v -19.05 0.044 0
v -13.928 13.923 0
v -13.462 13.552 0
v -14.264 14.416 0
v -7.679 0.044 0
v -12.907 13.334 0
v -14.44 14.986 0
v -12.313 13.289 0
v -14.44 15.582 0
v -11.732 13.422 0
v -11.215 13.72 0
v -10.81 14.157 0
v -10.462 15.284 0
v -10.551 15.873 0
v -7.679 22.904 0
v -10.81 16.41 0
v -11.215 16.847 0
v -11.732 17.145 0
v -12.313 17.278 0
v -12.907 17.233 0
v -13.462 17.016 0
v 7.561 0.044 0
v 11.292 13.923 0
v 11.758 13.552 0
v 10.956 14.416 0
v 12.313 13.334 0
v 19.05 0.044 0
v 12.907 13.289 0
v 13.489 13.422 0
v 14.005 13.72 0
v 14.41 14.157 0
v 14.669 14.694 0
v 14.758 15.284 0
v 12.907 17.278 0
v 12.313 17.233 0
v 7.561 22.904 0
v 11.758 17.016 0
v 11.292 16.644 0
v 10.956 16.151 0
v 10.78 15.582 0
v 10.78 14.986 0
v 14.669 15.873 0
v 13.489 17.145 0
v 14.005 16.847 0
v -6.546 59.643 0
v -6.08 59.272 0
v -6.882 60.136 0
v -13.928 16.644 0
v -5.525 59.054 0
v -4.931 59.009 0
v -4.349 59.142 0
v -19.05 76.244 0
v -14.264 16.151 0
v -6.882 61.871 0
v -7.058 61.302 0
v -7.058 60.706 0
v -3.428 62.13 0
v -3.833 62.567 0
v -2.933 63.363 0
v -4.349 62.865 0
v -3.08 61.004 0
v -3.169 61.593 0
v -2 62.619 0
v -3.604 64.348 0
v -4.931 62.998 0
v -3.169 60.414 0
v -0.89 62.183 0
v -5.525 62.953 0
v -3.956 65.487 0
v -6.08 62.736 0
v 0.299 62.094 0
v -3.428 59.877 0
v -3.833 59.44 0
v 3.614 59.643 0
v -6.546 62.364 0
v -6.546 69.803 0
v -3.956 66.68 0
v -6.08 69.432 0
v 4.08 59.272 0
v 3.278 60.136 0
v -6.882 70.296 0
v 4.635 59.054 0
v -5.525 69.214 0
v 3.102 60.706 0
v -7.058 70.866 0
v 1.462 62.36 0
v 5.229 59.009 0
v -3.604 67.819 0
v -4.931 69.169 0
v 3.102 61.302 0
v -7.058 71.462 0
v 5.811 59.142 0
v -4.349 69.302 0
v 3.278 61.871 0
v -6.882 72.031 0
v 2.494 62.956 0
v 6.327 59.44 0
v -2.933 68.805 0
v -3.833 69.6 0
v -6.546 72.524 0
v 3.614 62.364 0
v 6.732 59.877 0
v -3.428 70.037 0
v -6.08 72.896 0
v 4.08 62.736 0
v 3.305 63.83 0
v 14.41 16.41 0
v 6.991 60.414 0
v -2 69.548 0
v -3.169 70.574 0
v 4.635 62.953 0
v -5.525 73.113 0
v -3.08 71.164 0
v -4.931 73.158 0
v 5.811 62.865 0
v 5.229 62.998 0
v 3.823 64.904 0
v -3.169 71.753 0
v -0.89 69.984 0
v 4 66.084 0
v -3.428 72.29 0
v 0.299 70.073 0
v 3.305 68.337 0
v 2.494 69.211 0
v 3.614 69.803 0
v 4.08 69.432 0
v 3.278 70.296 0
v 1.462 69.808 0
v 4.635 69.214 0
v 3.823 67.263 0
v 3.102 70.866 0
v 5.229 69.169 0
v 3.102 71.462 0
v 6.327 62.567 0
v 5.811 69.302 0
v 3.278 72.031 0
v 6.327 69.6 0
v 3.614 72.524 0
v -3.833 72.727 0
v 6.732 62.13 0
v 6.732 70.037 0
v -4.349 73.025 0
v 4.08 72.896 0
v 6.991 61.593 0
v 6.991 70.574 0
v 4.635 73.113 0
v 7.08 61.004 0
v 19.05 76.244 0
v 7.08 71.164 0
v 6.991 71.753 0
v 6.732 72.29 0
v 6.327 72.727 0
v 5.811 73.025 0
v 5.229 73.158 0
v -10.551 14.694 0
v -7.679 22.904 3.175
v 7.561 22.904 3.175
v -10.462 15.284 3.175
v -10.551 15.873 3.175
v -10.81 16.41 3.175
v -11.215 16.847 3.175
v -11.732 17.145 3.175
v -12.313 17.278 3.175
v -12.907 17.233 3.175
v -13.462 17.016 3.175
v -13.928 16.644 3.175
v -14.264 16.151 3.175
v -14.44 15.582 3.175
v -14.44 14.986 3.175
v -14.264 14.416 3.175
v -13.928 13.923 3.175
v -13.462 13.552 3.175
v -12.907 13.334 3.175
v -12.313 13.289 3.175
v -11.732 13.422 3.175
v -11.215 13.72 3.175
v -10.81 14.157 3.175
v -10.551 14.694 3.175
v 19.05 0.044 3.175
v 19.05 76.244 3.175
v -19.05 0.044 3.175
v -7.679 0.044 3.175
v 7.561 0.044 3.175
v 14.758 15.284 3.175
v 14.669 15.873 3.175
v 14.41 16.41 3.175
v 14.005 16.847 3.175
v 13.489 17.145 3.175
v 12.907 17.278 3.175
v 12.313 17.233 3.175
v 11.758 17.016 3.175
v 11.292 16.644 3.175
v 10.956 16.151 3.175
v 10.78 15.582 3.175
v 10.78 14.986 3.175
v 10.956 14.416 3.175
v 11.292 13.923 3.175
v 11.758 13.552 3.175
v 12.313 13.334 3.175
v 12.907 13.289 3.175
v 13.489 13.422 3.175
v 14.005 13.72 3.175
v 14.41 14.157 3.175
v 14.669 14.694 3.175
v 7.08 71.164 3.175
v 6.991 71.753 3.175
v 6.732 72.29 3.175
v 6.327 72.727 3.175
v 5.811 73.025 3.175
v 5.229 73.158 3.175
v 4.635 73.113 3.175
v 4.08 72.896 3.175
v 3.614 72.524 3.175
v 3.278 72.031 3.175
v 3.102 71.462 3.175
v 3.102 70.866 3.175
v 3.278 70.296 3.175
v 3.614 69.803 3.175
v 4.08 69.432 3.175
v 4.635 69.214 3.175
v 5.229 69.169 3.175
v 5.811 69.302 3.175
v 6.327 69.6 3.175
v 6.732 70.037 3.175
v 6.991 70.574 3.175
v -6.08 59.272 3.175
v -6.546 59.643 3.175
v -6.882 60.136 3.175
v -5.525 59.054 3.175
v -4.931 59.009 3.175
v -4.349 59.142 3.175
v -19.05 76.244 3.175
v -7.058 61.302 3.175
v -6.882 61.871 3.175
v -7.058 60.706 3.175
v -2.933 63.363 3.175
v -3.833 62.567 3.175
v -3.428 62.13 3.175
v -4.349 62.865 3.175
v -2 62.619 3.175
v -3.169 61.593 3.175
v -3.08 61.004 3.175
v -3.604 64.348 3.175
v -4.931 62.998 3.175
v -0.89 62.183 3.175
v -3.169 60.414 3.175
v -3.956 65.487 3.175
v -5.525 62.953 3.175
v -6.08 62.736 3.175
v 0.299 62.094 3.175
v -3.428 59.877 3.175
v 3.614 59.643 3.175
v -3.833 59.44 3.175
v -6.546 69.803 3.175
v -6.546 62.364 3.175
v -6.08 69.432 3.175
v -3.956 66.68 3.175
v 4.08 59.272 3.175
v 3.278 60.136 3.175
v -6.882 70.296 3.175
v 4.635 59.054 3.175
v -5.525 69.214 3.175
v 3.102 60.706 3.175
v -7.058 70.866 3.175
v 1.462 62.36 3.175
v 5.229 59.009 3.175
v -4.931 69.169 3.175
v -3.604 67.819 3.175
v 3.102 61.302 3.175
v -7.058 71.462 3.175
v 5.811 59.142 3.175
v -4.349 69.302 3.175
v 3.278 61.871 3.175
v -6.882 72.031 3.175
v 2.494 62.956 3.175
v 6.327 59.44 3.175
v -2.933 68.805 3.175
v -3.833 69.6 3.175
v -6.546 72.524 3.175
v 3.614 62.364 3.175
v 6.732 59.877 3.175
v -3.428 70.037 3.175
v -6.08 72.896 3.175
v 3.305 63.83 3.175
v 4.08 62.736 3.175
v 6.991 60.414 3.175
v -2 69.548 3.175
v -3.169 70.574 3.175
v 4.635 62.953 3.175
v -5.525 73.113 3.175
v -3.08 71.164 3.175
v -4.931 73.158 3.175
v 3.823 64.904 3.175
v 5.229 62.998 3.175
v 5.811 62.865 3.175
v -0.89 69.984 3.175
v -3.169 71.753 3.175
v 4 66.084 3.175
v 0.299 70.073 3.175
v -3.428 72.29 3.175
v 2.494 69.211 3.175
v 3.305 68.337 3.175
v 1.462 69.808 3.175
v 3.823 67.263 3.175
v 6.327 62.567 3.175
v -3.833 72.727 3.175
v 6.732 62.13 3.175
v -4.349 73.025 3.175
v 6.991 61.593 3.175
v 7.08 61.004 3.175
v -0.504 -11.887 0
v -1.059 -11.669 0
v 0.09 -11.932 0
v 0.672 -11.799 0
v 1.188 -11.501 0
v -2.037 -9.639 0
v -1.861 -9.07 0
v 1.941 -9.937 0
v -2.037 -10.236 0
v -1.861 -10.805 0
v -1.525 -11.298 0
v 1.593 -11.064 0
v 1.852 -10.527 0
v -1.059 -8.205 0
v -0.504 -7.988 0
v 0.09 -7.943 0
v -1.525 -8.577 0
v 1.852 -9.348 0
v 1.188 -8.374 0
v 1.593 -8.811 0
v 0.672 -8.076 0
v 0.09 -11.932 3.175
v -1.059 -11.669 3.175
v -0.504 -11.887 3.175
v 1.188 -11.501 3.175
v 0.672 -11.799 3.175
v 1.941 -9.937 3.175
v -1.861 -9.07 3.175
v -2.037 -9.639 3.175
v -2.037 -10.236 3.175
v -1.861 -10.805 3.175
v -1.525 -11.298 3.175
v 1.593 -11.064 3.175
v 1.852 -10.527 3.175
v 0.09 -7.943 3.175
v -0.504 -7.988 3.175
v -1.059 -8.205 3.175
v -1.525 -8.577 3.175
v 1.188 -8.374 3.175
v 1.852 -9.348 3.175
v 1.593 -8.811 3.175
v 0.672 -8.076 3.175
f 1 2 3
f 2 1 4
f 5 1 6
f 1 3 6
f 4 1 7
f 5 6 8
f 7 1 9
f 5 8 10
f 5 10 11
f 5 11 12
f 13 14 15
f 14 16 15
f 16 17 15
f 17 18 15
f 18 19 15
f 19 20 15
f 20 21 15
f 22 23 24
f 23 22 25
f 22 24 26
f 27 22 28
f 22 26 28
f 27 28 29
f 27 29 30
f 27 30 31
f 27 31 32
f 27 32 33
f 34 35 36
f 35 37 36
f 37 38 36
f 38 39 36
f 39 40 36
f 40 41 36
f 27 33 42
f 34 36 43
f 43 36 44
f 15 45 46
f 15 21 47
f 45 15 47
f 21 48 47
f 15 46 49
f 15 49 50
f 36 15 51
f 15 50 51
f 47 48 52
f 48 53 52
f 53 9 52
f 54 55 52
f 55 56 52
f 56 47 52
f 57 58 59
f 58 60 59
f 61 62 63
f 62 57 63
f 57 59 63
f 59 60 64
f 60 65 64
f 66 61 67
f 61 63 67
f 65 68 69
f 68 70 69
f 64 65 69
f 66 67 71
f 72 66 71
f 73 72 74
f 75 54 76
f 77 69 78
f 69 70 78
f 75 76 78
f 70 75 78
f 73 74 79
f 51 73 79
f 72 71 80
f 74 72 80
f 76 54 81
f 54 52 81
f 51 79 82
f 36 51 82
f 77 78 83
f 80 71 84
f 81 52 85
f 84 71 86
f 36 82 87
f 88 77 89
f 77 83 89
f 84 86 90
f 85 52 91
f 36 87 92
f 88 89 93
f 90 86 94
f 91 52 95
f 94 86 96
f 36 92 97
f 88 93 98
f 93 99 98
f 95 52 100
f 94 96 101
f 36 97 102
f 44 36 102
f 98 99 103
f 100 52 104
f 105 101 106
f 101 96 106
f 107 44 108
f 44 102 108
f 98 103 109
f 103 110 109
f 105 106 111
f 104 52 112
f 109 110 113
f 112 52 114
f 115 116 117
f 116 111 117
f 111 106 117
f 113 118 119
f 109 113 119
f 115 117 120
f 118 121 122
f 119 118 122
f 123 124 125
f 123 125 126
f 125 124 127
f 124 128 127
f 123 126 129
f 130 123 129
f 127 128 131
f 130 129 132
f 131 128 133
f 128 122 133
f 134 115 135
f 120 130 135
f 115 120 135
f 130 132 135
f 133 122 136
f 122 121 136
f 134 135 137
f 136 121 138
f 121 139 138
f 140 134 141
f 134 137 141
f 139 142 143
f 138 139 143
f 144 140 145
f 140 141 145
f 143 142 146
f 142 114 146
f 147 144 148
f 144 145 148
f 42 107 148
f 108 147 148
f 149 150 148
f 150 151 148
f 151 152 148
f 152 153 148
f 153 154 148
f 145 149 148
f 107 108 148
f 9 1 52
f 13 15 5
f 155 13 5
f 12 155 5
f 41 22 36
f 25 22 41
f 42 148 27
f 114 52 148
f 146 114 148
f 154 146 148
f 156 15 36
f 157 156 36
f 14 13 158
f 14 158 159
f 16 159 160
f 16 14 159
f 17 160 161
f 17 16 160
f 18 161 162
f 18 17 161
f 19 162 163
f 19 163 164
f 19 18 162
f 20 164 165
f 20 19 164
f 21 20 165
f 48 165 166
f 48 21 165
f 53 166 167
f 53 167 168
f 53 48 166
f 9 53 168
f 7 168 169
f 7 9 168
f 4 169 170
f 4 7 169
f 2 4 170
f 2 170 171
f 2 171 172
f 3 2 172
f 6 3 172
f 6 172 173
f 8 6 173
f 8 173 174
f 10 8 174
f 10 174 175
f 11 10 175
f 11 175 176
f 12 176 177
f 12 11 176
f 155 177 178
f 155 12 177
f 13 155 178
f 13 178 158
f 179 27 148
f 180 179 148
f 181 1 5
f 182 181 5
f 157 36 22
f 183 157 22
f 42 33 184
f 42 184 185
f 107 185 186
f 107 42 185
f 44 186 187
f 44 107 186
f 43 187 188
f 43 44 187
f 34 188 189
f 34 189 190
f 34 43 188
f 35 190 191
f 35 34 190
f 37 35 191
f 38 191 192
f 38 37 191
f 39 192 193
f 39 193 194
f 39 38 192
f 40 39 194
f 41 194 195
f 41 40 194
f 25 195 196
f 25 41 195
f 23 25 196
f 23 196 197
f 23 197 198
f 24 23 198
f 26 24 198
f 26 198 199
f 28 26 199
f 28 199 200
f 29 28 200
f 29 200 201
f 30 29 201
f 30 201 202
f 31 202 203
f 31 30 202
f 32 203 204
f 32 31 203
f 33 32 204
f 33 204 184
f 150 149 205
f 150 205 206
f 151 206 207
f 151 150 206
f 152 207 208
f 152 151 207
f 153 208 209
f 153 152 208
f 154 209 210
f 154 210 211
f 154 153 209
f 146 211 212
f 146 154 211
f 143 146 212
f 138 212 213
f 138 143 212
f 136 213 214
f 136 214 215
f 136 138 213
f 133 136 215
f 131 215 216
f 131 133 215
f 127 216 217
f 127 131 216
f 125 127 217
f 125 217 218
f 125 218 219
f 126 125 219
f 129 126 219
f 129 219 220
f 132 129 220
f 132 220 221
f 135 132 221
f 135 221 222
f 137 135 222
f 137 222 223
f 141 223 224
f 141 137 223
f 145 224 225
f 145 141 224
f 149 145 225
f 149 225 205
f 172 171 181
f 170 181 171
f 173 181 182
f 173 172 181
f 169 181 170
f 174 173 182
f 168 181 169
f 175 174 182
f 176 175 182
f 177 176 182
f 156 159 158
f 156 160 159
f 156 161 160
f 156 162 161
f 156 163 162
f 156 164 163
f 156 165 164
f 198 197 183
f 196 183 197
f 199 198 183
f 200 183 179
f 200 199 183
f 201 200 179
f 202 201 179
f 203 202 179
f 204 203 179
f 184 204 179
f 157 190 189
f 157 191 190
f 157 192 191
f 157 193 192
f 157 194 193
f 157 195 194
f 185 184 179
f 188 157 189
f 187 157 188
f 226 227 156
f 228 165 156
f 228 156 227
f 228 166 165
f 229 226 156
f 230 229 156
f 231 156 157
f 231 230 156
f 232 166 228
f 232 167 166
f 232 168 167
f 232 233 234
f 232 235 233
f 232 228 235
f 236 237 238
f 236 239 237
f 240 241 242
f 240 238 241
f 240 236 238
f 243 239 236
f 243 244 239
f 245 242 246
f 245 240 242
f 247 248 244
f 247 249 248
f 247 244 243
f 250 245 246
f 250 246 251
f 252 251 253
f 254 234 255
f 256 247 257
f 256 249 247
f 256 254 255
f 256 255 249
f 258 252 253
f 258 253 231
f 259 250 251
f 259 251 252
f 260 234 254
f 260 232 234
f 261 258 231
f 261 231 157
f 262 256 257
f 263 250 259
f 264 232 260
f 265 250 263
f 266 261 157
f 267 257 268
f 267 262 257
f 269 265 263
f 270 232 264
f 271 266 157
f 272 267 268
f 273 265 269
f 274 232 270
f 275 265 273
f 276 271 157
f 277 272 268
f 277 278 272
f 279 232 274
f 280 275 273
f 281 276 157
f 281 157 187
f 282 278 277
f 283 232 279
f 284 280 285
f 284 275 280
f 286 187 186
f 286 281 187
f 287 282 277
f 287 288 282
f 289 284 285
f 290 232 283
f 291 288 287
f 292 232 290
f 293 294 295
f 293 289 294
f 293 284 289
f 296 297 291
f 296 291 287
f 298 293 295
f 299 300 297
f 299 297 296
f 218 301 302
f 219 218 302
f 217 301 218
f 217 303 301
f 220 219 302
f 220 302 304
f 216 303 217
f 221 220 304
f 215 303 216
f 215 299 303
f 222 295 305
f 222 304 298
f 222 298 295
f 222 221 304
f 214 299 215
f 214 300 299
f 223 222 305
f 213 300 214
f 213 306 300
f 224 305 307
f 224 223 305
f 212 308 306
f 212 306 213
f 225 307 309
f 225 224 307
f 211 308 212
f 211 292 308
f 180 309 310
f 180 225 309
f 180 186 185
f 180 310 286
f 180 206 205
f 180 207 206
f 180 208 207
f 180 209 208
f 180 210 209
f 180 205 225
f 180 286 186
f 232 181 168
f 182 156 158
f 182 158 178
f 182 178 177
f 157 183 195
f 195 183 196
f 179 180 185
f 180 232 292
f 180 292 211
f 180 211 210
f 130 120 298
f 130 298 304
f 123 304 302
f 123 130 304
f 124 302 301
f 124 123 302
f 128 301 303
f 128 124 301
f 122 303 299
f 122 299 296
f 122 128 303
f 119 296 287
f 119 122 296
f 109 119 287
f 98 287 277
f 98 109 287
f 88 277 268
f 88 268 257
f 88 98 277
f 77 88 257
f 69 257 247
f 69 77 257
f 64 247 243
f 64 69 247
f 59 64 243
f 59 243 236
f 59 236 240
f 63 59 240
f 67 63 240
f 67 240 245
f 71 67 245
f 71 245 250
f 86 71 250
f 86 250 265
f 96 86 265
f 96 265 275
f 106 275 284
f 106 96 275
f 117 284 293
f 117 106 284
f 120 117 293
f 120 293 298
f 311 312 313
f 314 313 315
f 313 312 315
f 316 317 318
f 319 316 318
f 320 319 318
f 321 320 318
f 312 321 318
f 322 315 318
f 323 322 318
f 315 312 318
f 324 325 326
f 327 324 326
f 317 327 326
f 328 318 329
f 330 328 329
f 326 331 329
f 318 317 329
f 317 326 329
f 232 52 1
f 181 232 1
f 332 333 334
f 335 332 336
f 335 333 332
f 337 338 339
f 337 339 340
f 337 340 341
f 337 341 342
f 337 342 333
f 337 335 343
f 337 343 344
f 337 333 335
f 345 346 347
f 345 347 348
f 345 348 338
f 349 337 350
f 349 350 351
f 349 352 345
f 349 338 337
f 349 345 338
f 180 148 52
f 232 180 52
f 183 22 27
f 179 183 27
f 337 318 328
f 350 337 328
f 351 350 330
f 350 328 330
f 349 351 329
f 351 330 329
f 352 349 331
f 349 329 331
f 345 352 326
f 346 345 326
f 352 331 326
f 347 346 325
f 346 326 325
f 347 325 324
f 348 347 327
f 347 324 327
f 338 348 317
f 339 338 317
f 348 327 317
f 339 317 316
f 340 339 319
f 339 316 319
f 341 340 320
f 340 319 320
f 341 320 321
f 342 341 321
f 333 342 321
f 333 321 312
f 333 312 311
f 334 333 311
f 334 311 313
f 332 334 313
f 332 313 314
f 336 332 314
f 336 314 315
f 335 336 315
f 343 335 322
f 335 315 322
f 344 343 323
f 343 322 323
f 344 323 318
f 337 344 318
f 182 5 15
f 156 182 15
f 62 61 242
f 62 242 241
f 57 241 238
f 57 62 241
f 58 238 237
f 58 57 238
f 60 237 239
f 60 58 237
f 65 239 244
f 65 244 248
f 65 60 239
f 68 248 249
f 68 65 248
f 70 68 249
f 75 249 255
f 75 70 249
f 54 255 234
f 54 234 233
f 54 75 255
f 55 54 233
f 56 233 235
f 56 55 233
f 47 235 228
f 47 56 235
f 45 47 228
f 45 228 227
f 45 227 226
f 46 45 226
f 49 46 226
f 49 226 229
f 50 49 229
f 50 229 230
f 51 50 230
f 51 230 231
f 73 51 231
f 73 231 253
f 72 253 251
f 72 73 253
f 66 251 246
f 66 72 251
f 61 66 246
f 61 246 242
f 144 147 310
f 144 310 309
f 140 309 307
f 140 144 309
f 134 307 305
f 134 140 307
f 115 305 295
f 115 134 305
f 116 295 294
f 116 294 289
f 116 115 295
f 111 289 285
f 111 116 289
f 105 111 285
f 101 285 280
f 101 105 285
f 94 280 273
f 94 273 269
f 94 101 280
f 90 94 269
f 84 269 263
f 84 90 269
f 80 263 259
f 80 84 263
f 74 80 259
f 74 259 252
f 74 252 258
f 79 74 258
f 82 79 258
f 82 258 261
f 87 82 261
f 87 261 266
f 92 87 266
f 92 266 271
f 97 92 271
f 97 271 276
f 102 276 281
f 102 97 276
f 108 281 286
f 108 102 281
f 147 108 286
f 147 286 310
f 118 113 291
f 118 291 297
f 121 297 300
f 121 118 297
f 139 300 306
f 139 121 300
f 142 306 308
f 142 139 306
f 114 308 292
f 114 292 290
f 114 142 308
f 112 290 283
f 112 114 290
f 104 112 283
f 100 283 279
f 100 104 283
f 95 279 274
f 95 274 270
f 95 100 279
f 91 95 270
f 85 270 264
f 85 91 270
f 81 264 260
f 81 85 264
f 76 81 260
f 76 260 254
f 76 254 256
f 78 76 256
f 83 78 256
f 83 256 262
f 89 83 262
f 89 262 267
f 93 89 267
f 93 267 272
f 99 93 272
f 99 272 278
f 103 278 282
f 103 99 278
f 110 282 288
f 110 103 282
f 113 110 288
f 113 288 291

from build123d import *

# Parameters (mm, degrees)
F0_R     = 2
F0_R_2   = 4.0005
F2_DEPTH = 3.175


with BuildPart() as f2:
    # F0 (on Top) → F2 (new body)
    with BuildSketch(Plane.XY):
        with Locations((-0.059144, -9.937426)):
            Circle(F0_R)
        Polygon((-19.05, 76.243628), (-19.05, 0.043628), (-7.679144, 0.043628), (-7.679144, 22.903628), (7.560856, 22.903628), (7.560856, 0.043628), (19.05, 0.043628), (19.05, 76.243628), align=None)
        with Locations((-12.46229, 15.283628)):
            Circle(F0_R, mode=Mode.SUBTRACT)
        with Locations((12.758011, 15.283628)):
            Circle(F0_R, mode=Mode.SUBTRACT)
        with Locations((-5.08, 61.003628)):
            Circle(F0_R, mode=Mode.SUBTRACT)
        with Locations((-5.08, 71.163628)):
            Circle(F0_R, mode=Mode.SUBTRACT)
        with Locations((5.08, 61.003628)):
            Circle(F0_R, mode=Mode.SUBTRACT)
        with Locations((0, 66.083628)):
            Circle(F0_R_2, mode=Mode.SUBTRACT)
        with Locations((5.08, 71.163628)):
            Circle(F0_R, mode=Mode.SUBTRACT)
    extrude(amount=F2_DEPTH)


solid = f2.part
